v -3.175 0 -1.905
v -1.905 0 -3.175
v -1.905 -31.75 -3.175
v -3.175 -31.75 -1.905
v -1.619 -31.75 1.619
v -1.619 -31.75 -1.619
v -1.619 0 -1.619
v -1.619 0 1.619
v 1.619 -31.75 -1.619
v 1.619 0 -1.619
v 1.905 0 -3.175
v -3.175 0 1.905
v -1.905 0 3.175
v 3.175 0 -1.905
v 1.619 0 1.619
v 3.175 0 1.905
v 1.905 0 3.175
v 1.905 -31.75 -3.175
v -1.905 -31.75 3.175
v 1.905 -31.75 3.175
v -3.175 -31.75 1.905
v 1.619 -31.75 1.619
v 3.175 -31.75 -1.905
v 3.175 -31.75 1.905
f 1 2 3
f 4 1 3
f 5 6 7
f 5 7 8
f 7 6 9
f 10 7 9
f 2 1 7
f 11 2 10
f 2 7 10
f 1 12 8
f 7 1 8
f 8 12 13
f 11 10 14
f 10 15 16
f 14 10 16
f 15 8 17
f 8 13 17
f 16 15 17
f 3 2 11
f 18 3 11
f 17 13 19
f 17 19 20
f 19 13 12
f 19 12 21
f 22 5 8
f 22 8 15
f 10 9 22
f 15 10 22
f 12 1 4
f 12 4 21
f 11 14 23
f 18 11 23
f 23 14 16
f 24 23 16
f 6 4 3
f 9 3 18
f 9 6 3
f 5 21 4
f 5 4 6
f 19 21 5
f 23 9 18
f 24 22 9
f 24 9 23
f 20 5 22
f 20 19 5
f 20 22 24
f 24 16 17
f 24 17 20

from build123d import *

# Parameters (mm, degrees)
F0_W     = 6.35
F0_H     = 6.35
F0_W_2   = 3.2385
F0_H_2   = 3.2385
F1_DEPTH = 31.75
F2_SIZE  = 1.27


with BuildPart() as f1:
    # F0 (on Front) → F1 (new body)
    with BuildSketch(Plane.XZ):
        Rectangle(F0_W, F0_H)
        Rectangle(F0_W_2, F0_H_2, mode=Mode.SUBTRACT)
    extrude(amount=F1_DEPTH)

    # F2
    f2_edges = [f1.edges().sort_by_distance(p)[0] for p in [
        (3.175, -15.875, 3.175),
        (3.175, -15.875, -3.175),
        (-3.175, -15.875, -3.175),
        (-3.175, -15.875, 3.175),
    ]]
    chamfer(f2_edges, length=F2_SIZE)


solid = f1.part
